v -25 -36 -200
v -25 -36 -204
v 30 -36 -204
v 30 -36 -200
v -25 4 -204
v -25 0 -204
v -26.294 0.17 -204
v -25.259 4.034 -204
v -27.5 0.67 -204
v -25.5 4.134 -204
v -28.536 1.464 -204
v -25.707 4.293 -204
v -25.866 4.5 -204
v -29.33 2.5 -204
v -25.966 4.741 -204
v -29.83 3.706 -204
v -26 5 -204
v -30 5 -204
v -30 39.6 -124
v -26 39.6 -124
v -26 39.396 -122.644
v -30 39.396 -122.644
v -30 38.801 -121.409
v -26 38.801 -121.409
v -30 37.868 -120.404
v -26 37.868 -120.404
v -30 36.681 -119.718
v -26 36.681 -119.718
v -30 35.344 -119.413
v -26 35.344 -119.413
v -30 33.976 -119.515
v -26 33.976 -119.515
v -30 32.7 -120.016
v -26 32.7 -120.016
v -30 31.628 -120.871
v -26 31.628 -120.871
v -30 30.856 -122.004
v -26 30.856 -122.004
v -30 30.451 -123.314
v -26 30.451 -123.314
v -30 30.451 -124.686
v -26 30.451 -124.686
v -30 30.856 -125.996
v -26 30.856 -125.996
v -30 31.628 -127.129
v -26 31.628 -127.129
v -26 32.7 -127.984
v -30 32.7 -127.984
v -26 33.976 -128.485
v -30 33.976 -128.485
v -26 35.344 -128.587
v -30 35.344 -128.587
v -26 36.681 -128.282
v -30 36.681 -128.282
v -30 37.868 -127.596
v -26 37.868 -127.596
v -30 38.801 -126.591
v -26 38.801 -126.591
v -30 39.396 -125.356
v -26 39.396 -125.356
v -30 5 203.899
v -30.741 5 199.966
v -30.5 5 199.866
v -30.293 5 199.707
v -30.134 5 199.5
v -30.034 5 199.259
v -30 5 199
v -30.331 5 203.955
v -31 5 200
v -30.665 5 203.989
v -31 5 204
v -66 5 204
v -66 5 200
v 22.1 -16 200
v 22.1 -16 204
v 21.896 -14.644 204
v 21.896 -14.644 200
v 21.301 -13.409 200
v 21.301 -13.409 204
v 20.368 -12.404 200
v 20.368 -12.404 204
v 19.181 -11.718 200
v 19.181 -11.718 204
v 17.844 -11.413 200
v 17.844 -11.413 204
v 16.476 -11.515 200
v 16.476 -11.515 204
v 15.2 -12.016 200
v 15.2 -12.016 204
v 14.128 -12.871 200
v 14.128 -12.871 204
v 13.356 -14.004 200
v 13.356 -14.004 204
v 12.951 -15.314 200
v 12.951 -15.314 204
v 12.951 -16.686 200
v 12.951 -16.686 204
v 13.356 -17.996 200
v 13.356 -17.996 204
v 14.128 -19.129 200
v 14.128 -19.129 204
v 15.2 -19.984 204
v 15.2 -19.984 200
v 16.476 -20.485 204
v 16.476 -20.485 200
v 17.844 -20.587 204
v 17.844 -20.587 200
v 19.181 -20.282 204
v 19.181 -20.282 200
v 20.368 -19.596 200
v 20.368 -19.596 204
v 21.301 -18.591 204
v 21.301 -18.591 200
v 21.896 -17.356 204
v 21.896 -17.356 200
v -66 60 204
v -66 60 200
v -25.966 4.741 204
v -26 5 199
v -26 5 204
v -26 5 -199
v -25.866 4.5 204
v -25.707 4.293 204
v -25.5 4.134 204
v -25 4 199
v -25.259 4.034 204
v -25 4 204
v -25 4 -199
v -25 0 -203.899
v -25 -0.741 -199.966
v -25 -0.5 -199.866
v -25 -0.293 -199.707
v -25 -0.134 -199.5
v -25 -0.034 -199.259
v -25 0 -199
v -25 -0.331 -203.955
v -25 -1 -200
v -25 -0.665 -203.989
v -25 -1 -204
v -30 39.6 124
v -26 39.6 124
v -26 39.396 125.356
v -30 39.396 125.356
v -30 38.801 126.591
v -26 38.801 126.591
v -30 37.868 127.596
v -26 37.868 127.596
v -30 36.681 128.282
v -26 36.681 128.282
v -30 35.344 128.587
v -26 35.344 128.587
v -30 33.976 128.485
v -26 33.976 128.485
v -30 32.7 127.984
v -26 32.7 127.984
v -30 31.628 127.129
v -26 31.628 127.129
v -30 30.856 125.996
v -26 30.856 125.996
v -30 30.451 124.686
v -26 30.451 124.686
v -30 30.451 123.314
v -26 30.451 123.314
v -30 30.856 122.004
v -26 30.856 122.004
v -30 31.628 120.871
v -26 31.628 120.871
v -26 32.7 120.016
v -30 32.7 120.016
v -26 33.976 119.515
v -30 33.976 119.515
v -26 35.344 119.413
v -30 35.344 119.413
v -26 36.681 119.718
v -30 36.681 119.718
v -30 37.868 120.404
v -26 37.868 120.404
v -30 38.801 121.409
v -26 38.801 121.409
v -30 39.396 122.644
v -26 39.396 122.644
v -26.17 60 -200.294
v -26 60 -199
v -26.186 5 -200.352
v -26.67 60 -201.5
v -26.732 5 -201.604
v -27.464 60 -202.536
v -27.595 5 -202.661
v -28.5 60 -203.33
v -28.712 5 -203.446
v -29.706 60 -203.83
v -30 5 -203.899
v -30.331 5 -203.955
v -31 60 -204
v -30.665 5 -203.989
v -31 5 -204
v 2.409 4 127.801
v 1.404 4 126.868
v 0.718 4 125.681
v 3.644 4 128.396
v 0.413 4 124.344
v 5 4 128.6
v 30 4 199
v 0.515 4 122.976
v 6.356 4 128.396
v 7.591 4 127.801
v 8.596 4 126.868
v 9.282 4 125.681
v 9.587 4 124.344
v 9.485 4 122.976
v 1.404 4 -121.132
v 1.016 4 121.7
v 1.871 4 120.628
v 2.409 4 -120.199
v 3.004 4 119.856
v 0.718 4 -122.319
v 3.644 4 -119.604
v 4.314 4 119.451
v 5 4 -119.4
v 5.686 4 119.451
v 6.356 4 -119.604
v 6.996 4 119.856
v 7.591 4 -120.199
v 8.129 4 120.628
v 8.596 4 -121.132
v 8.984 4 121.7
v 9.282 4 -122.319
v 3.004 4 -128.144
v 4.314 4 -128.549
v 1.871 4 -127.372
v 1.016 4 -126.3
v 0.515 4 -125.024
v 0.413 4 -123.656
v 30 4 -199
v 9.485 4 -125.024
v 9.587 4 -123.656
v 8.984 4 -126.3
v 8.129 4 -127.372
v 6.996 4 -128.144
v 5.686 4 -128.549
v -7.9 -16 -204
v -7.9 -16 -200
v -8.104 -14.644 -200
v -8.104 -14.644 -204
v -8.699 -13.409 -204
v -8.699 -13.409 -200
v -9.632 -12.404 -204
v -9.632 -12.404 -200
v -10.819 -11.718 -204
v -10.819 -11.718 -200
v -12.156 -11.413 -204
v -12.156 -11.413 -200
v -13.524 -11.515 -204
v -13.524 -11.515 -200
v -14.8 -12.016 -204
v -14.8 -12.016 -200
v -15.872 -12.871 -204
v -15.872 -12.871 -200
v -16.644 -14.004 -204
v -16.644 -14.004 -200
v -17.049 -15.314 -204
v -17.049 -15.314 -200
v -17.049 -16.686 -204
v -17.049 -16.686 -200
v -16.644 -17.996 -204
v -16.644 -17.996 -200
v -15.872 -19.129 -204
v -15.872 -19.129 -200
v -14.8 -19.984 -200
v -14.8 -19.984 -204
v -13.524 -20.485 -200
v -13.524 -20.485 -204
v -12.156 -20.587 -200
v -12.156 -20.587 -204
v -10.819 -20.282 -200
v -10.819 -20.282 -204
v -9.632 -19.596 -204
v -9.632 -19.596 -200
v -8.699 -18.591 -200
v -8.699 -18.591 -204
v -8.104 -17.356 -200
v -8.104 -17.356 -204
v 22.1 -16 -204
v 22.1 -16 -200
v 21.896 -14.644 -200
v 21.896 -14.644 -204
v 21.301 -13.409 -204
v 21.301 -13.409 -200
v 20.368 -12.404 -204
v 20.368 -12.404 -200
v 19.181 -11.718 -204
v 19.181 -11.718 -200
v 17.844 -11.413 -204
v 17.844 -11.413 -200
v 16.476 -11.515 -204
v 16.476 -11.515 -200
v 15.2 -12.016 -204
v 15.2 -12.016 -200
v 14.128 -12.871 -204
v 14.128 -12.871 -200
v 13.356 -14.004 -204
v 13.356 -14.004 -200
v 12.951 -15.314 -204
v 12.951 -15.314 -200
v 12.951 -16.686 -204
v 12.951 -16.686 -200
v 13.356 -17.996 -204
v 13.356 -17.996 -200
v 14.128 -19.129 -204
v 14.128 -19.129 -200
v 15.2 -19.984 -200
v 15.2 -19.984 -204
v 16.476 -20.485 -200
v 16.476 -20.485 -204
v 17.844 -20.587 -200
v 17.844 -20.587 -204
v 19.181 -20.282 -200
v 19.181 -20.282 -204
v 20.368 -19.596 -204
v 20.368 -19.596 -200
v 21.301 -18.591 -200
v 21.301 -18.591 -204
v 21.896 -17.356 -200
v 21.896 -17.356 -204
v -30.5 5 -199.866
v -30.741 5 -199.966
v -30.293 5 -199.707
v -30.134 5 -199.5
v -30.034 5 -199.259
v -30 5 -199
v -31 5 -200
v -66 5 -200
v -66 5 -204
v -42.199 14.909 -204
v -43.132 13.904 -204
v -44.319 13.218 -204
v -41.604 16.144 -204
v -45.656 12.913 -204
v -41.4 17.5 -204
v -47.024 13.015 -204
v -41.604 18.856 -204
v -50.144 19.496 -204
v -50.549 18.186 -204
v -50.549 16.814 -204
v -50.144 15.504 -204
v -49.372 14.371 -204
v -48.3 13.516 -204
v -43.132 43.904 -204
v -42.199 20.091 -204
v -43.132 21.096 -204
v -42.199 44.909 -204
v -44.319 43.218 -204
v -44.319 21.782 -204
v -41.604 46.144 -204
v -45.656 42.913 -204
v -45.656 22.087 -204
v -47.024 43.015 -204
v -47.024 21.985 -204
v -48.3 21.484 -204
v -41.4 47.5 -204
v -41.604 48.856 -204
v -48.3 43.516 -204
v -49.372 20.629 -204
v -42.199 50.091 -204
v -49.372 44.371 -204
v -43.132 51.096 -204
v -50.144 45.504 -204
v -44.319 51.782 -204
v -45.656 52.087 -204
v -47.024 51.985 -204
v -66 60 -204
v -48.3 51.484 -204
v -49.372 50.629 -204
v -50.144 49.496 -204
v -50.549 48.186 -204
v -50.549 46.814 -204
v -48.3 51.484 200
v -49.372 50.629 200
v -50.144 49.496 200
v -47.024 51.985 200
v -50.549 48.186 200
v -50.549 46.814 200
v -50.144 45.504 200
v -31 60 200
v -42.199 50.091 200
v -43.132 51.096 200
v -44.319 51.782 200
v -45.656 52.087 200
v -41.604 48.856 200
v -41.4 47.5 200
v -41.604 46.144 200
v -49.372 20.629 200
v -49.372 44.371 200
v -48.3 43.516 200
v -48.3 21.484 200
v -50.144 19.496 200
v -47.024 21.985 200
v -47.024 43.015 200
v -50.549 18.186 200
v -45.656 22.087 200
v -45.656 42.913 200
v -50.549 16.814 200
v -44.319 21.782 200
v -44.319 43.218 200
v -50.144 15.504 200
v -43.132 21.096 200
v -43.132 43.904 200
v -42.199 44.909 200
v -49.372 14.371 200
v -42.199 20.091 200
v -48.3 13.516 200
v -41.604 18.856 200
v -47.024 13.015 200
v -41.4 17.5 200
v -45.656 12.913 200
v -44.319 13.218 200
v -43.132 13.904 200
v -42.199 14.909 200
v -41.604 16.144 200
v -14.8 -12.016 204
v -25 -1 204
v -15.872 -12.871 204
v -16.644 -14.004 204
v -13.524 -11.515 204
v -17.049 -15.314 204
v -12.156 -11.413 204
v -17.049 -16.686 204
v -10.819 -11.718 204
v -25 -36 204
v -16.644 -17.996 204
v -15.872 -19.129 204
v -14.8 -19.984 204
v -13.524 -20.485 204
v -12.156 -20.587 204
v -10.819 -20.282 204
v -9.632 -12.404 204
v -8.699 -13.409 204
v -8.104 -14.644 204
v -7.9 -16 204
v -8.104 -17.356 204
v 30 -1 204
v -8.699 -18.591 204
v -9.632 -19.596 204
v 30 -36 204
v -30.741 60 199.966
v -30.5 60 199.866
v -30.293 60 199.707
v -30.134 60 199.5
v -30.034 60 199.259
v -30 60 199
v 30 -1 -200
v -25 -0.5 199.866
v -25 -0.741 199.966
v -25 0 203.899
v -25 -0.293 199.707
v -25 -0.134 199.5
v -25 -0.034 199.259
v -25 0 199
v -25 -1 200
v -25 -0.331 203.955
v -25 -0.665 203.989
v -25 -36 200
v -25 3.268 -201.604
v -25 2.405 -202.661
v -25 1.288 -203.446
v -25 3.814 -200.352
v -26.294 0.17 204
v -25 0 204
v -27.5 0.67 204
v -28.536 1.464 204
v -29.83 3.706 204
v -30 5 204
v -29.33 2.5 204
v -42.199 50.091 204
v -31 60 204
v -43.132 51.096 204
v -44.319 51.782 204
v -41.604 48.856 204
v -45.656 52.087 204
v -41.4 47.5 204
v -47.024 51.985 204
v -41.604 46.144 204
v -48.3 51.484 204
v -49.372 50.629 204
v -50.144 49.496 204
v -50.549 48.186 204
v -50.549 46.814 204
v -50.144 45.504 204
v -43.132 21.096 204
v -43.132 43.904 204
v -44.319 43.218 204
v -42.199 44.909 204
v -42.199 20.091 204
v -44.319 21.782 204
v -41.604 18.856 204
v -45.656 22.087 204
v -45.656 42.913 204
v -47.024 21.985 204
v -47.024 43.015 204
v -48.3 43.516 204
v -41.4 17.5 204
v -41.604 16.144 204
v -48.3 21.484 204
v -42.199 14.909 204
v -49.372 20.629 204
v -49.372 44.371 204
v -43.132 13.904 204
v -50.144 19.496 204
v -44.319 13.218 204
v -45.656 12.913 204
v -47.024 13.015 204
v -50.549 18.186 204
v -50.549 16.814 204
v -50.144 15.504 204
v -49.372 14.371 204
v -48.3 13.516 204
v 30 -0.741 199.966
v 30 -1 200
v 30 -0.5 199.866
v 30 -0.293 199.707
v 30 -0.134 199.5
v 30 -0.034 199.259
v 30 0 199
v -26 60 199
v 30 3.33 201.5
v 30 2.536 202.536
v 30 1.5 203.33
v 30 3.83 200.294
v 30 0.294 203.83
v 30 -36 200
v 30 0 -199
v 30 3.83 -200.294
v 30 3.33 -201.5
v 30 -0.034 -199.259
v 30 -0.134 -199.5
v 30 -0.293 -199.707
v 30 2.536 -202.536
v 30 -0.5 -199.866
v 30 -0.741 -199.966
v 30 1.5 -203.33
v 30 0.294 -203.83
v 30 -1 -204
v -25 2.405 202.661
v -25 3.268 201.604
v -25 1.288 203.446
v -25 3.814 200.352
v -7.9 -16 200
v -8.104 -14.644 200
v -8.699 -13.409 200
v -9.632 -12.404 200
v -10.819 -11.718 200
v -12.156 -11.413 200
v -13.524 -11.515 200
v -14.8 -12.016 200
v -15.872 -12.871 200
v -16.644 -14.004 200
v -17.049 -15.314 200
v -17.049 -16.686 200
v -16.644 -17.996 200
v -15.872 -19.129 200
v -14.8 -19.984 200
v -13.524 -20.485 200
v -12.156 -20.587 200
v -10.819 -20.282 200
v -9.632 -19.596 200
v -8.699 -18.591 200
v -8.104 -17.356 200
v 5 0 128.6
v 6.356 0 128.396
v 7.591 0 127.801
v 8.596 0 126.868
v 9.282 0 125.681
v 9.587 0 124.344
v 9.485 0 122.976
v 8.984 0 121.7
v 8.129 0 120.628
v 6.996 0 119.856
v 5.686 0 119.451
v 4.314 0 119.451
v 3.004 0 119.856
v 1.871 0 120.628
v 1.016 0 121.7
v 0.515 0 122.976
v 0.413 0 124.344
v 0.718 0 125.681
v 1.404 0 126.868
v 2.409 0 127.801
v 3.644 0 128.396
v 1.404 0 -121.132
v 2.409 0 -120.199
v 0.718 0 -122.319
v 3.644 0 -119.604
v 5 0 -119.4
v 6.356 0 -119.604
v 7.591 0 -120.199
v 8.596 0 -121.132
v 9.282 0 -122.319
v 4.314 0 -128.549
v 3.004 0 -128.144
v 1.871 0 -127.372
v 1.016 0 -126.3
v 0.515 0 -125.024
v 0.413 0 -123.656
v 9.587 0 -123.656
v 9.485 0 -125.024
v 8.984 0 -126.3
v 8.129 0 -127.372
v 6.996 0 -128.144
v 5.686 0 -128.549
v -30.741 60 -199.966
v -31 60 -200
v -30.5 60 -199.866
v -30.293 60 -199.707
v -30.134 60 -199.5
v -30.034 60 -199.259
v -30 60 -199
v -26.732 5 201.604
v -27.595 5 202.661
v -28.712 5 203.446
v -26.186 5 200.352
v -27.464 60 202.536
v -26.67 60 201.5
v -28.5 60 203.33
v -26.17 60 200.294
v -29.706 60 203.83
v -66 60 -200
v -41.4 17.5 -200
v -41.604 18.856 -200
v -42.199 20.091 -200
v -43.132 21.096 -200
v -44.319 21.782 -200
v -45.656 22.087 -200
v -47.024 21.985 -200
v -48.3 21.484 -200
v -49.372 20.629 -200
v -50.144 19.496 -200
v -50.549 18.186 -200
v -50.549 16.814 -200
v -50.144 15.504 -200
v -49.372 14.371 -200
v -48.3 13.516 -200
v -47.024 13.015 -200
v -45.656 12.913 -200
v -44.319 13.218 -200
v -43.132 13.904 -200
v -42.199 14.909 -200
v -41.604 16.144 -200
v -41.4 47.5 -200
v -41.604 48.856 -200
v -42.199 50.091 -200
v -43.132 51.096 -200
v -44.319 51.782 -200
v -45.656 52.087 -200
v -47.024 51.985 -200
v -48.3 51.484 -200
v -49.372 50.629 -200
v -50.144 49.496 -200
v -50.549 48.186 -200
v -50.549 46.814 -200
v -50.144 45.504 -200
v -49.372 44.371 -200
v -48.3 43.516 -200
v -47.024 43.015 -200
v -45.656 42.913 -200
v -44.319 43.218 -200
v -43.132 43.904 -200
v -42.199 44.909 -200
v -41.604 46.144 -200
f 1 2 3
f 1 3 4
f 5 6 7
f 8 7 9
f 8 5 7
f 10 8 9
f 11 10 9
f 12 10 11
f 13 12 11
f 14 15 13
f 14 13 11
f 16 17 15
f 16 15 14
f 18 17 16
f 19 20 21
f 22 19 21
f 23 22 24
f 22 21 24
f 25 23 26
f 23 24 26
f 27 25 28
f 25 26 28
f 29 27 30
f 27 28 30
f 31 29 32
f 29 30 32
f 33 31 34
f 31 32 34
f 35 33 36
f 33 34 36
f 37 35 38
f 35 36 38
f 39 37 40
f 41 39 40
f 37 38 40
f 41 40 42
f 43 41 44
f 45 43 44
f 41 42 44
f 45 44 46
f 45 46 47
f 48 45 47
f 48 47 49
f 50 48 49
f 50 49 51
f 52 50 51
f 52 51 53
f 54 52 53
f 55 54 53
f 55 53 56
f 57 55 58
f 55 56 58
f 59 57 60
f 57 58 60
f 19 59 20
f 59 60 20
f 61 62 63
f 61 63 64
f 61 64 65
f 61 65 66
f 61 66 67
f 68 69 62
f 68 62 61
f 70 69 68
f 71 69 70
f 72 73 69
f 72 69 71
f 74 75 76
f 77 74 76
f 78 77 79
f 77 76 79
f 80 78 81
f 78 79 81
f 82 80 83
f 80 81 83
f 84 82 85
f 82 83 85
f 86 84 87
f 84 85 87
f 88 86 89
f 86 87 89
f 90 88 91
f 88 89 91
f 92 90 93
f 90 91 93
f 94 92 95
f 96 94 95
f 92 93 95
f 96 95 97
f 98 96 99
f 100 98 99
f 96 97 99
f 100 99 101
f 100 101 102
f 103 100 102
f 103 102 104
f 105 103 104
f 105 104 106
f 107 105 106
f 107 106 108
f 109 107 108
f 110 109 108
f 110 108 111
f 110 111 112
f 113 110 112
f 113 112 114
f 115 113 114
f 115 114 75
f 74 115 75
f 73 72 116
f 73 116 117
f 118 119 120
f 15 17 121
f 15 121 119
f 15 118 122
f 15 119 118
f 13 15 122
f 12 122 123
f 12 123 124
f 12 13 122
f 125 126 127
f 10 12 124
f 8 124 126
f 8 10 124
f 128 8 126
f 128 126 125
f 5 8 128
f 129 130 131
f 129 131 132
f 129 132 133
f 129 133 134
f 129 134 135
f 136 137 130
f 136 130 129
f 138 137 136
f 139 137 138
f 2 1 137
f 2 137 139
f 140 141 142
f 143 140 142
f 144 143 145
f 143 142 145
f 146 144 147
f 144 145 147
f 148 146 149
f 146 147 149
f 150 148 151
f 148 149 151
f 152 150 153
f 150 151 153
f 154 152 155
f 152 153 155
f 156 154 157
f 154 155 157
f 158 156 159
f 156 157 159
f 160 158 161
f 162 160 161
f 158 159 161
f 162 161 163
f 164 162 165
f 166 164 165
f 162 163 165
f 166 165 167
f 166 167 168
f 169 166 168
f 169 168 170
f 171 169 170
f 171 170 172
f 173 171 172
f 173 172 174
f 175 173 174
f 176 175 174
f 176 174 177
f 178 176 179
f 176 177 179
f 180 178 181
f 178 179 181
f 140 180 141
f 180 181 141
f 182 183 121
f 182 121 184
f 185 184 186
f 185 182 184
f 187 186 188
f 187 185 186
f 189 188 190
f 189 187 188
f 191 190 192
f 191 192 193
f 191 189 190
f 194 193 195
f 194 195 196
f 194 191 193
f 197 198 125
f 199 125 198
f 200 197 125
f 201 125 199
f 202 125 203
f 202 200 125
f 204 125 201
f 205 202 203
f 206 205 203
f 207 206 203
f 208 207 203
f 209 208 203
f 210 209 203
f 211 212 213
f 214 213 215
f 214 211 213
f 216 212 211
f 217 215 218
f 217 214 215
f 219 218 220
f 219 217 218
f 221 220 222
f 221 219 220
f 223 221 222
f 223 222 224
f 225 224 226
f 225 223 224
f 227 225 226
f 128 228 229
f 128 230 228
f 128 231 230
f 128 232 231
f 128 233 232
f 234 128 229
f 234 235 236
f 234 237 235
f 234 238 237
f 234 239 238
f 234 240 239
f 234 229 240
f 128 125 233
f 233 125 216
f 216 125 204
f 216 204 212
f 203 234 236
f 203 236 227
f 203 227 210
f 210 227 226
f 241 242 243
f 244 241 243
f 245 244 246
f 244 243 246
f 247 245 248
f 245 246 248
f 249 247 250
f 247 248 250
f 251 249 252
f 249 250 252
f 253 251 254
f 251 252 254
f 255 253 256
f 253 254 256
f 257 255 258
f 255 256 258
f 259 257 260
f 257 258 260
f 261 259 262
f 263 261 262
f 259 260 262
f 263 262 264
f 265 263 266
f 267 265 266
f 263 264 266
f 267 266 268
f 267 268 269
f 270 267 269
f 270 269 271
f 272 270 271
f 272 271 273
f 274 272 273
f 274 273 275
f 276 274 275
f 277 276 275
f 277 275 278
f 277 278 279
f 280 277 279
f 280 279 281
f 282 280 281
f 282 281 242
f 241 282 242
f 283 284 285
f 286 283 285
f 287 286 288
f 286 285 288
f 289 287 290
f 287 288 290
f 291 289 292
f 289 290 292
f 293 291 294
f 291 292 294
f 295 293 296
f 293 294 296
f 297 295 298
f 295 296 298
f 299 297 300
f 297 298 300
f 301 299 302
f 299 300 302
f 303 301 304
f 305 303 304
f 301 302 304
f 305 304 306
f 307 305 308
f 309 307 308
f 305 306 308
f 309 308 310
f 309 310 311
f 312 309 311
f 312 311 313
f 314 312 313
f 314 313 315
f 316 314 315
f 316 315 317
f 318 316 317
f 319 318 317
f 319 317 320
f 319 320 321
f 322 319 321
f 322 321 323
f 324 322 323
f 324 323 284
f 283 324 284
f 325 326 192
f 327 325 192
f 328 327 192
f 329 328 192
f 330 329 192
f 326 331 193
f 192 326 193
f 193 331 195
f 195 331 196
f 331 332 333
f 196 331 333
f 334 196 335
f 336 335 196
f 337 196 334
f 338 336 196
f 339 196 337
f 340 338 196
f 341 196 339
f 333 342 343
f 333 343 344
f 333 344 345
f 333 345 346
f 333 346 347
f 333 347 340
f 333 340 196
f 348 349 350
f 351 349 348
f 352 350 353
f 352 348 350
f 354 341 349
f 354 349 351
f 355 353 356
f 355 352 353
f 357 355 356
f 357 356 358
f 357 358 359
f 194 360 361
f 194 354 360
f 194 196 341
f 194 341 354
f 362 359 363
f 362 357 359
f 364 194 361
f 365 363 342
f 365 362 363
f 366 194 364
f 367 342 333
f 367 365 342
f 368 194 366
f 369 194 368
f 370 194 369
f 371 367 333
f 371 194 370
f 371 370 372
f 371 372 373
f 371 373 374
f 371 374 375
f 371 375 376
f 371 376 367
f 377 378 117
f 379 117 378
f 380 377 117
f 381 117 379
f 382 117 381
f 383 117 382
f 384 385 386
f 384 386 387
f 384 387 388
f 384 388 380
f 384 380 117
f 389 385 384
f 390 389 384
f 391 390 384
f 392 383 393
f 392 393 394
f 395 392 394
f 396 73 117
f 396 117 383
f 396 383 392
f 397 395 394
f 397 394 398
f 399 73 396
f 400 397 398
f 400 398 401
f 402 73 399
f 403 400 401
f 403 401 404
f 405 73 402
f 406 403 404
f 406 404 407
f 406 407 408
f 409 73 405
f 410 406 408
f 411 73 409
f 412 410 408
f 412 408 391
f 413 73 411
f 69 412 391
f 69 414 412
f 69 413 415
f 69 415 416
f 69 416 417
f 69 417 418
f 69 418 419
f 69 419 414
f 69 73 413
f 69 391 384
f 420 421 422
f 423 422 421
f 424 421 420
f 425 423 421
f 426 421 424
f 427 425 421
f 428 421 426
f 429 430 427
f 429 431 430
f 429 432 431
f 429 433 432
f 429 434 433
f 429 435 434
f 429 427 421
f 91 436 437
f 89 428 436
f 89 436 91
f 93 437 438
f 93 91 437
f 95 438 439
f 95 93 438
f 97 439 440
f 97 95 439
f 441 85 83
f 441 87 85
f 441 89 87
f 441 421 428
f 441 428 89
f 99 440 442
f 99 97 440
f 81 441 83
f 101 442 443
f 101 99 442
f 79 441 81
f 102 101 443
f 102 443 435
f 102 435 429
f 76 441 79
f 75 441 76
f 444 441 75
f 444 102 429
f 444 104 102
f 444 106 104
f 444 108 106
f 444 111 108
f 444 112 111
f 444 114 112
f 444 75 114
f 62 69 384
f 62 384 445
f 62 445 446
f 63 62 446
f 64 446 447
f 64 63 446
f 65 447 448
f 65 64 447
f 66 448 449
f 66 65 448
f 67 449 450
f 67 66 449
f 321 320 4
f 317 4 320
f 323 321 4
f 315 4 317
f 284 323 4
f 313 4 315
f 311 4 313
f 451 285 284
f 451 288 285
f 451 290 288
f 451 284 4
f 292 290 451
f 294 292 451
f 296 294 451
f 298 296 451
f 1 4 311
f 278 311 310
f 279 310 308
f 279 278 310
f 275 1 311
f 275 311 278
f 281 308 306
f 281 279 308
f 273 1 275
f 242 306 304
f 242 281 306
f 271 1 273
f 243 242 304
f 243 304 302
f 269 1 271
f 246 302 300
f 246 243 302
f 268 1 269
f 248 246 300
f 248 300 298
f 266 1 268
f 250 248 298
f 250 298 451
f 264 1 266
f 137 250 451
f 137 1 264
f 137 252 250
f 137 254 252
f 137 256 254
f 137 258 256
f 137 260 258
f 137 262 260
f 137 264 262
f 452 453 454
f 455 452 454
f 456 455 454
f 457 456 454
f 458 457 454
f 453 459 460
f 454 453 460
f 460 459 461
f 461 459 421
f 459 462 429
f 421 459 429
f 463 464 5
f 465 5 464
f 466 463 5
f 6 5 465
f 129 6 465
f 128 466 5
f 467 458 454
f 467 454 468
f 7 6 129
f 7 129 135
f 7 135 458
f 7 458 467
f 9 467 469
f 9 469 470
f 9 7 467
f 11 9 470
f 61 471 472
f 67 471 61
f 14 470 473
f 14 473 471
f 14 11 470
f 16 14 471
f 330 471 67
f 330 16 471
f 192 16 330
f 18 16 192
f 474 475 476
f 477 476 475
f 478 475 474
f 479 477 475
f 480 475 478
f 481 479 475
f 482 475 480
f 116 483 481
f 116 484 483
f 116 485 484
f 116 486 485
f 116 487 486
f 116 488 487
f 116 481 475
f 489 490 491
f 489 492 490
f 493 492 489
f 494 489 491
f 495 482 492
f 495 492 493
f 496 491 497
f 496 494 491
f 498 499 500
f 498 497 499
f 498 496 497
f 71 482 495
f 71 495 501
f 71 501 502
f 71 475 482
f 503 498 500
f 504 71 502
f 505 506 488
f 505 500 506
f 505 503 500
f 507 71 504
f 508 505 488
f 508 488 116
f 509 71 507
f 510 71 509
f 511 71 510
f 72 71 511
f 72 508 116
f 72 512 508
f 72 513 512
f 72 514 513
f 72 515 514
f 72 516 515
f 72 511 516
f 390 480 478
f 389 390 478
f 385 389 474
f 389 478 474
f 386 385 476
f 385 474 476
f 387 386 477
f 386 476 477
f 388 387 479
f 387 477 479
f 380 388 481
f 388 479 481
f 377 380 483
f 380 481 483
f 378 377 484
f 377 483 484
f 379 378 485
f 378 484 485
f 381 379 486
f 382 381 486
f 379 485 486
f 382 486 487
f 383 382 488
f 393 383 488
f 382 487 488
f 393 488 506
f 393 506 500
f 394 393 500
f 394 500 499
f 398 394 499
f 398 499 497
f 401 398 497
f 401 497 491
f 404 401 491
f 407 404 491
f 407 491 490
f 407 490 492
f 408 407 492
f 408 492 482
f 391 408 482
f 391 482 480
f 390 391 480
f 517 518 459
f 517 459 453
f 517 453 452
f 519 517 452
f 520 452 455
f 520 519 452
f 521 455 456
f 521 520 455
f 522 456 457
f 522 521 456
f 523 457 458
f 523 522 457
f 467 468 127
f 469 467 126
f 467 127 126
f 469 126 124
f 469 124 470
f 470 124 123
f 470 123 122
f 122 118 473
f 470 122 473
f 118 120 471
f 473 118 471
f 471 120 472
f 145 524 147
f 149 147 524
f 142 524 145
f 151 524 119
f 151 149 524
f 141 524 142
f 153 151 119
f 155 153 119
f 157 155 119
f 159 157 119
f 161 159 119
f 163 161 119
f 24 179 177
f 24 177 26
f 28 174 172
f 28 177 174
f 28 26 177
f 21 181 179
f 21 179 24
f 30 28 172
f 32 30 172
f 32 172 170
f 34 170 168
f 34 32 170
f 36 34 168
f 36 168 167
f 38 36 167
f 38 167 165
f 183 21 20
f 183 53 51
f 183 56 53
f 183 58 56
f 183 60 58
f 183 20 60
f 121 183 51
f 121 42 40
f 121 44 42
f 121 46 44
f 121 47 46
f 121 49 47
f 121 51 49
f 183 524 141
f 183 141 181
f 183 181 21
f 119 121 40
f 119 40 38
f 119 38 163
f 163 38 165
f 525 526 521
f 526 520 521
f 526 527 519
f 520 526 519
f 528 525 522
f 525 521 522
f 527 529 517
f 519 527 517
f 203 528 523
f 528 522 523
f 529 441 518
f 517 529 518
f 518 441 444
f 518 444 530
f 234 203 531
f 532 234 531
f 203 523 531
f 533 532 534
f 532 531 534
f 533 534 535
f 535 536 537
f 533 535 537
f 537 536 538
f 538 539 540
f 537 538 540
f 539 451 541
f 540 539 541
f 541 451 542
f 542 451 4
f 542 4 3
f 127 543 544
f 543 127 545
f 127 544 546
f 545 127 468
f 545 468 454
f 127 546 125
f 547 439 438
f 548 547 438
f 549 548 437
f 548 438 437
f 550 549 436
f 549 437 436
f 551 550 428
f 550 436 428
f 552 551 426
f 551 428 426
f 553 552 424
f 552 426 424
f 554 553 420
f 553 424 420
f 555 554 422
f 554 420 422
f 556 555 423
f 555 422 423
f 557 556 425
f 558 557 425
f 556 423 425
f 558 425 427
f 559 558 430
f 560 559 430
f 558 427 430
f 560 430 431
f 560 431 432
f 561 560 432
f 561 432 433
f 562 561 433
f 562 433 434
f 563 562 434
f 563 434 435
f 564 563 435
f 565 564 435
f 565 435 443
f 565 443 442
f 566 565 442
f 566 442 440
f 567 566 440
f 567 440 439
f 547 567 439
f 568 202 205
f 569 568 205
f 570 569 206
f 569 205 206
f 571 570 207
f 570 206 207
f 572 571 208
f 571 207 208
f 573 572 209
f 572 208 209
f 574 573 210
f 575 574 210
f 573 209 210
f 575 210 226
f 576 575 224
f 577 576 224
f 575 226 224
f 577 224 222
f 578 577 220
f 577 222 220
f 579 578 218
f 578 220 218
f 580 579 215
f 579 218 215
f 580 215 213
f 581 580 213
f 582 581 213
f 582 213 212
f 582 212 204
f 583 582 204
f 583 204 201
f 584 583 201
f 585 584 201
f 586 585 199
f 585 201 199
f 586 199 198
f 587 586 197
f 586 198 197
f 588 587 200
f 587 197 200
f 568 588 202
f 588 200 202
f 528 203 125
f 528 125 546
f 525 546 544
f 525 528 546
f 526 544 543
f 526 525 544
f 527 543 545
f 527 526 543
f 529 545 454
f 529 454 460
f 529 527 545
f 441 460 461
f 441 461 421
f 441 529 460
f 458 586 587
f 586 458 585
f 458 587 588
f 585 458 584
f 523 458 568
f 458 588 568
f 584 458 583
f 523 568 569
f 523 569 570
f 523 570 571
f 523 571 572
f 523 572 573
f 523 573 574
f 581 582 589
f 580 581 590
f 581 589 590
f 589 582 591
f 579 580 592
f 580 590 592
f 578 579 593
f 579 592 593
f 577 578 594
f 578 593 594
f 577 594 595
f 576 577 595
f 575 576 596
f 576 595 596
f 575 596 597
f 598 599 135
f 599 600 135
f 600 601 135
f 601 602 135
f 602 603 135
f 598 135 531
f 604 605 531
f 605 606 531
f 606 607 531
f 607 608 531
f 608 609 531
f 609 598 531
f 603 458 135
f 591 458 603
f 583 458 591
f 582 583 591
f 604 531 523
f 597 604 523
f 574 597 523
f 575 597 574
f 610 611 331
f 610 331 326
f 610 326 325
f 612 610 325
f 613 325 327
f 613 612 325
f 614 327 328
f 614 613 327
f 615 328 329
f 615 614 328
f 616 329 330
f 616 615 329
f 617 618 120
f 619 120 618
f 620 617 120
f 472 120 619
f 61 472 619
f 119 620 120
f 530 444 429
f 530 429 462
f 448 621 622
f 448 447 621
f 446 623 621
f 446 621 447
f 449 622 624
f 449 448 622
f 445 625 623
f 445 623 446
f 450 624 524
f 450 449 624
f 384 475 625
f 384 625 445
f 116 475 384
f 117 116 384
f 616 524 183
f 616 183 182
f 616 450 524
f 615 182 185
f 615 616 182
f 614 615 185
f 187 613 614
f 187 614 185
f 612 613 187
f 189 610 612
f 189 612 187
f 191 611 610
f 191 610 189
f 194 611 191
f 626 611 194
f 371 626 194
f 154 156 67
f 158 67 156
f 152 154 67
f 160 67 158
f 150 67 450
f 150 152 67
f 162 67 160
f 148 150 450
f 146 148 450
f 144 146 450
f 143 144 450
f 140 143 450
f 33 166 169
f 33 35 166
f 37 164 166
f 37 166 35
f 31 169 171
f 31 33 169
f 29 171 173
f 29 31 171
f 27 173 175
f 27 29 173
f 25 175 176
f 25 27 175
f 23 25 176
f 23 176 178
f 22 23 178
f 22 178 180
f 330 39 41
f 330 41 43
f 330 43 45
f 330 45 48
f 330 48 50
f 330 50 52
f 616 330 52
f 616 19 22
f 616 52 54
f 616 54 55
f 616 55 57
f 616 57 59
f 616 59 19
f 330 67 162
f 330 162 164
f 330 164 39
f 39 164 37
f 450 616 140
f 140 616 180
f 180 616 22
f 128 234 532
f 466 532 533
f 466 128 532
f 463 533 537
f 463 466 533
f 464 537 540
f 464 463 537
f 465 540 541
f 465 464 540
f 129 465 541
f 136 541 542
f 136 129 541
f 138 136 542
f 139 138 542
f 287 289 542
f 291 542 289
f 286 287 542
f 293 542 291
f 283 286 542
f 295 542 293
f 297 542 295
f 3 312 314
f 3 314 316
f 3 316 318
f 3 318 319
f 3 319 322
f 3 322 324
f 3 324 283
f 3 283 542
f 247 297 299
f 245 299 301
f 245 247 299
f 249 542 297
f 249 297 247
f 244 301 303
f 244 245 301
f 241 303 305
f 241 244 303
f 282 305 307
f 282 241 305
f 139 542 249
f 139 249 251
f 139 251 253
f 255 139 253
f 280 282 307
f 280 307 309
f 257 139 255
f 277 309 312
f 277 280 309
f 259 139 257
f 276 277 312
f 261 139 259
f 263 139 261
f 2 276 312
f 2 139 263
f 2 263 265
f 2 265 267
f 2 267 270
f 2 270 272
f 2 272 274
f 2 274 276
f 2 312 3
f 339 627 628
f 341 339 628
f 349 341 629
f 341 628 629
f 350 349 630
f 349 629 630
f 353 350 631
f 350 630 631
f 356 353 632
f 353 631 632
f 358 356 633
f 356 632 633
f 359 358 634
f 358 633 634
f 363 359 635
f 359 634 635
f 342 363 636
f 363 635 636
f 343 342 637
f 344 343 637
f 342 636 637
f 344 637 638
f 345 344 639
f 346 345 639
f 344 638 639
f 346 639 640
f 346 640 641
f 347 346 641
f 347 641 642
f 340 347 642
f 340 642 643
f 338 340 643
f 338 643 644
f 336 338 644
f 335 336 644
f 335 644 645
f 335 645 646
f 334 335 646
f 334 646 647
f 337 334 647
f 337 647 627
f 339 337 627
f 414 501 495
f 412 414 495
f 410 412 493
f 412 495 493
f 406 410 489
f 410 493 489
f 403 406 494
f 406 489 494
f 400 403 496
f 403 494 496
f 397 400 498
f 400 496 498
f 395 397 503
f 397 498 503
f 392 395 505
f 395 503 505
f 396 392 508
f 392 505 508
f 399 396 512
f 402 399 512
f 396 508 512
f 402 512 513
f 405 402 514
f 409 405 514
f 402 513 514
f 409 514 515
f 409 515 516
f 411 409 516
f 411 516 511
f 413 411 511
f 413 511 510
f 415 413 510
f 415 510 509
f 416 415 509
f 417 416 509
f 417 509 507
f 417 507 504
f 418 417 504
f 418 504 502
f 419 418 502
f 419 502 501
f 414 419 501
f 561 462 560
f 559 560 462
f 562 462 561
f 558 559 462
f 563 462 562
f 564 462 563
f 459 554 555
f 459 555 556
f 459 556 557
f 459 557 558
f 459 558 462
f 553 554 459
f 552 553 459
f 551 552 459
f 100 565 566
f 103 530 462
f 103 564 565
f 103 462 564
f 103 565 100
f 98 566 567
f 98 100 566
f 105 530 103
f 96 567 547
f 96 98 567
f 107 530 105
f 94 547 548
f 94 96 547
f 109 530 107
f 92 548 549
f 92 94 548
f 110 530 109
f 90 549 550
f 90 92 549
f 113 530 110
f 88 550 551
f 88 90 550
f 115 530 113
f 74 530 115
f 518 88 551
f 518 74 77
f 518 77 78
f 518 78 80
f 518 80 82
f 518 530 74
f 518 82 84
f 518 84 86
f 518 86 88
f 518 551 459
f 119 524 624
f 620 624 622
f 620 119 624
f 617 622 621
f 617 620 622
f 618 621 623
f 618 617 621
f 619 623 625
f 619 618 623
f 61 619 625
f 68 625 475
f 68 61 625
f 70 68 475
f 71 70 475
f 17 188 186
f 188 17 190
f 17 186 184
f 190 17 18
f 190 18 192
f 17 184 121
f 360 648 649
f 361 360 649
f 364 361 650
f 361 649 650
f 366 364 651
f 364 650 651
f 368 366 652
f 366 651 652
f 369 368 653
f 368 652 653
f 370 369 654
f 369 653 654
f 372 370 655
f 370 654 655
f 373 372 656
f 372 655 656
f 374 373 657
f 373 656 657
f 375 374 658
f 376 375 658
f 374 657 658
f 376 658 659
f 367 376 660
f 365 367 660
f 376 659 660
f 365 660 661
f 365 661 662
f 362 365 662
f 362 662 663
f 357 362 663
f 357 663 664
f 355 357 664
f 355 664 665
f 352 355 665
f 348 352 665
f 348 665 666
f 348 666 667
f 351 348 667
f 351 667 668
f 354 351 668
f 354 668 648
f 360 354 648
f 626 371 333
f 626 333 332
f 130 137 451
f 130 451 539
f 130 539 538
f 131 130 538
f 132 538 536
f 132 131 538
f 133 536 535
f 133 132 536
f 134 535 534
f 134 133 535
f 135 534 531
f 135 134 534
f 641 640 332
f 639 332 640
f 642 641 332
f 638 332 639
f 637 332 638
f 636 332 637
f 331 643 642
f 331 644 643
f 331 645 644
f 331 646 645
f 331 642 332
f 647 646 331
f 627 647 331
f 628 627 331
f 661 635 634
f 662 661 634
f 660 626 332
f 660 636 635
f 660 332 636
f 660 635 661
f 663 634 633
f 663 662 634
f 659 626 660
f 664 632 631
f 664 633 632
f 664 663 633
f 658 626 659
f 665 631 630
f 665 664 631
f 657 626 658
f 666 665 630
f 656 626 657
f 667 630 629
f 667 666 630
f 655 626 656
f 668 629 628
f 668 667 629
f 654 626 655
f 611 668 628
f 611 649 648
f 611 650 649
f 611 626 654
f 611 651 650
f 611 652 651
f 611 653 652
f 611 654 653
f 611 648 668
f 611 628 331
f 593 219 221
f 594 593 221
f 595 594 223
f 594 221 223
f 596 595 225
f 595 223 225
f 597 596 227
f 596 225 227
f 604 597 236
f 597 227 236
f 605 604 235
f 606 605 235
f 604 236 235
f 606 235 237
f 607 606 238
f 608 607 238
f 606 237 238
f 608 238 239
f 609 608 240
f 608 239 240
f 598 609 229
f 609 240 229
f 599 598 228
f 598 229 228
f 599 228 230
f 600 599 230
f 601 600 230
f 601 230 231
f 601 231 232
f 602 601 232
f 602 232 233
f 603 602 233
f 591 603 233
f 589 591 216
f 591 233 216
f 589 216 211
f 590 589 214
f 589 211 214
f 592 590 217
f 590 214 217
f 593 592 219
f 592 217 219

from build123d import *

# Parameters (mm, degrees)
SKETCH1_W                      = 60
SKETCH1_H                      = 408
BASE_FLANGE1_DEPTH             = 4
EDGE_FLANGE1_STRIP_W           = 18
EDGE_FLANGE1_STRIP_H           = 4
EDGE_FLANGE1_STRIP_CUT_DEPTH   = 408
EDGE_FLANGE1_DEPTH             = 408
EDGE_FLANGE2_STRIP_W           = 18
EDGE_FLANGE2_STRIP_H           = 4
EDGE_FLANGE2_STRIP_CUT_DEPTH   = 55
EDGE_FLANGE2_STRIP_2_W         = 18
EDGE_FLANGE2_STRIP_2_H         = 4
EDGE_FLANGE2_STRIP_CUT_2_DEPTH = 55
EDGE_FLANGE2_STRIP_3_W         = 18
EDGE_FLANGE2_STRIP_3_H         = 4
EDGE_FLANGE2_STRIP_CUT_3_DEPTH = 55
EDGE_FLANGE2_STRIP_4_W         = 18
EDGE_FLANGE2_STRIP_4_H         = 4
EDGE_FLANGE2_STRIP_CUT_4_DEPTH = 55
EDGE_FLANGE2_DEPTH             = 55
EDGE_FLANGE2_BEND_DEPTH        = 55
EDGE_FLANGE2_BEND_2_DEPTH      = 55
EDGE_FLANGE2_BEND_3_DEPTH      = 55
SKETCH18_R                     = 4.6
EXTRUDE1_DEPTH                 = 418.636205327
SKETCH19_R                     = 4.6
EXTRUDE2_DEPTH                 = 4
SKETCH20_R                     = 4.6
EXTRUDE3_DEPTH                 = 4


# Sheet-metal steps are written as plain solids
with BuildPart() as part:
    # Sketch1 → Base-Flange1 (new body)
    with BuildSketch(Plane(origin=(0, 0, 0), x_dir=(1, 0, 0), z_dir=(0, 1, 0))):
        Rectangle(SKETCH1_W, SKETCH1_H)
    extrude(amount=BASE_FLANGE1_DEPTH)

    # Edge-Flange1 strip (across the edge) → Edge-Flange1 strip cut (cut)
    with BuildSketch(Plane(origin=(-30, 4, -204), x_dir=(1, 0, 0), z_dir=(0, 0, 1))):
        with Locations((-4, -2)):
            Rectangle(EDGE_FLANGE1_STRIP_W, EDGE_FLANGE1_STRIP_H)
    extrude(amount=EDGE_FLANGE1_STRIP_CUT_DEPTH, mode=Mode.SUBTRACT)

    # Edge-Flange1 section (across the edge) → Edge-Flange1 (add)
    with BuildSketch(Plane(origin=(-30, 4, -204), x_dir=(1, 0, 0), z_dir=(0, 0, 1))):
        with BuildLine():
            Line((0, 1), (0, 56))
            Line((0, 56), (4, 56))
            Line((4, 56), (4, 1))
            ThreePointArc((4, 1), (4.292893219, 0.292893219), (5, 0))
            Line((5, 0), (5, -4))
            ThreePointArc((5, -4), (1.464466094, -2.535533906), (0, 1))
        make_face()
    extrude(amount=EDGE_FLANGE1_DEPTH)

    # Edge-Flange2 strip (across the edge) → Edge-Flange2 strip cut (cut)
    with BuildSketch(Plane(origin=(-30, 5, 204), x_dir=(0, 0, -1), z_dir=(0, 1, 0))):
        with Locations((-4, -2)):
            Rectangle(EDGE_FLANGE2_STRIP_W, EDGE_FLANGE2_STRIP_H)
    extrude(amount=EDGE_FLANGE2_STRIP_CUT_DEPTH, mode=Mode.SUBTRACT)

    # Edge-Flange2 strip 2 (across the edge) → Edge-Flange2 strip cut 2 (cut)
    with BuildSketch(Plane(origin=(30, 0, 204), x_dir=(0, 0, -1), z_dir=(-1, 0, 0))):
        with Locations((-4, -2)):
            Rectangle(EDGE_FLANGE2_STRIP_2_W, EDGE_FLANGE2_STRIP_2_H)
    extrude(amount=EDGE_FLANGE2_STRIP_CUT_2_DEPTH, mode=Mode.SUBTRACT)

    # Edge-Flange2 strip 3 (across the edge) → Edge-Flange2 strip cut 3 (cut)
    with BuildSketch(Plane(origin=(-30, 60, -204), x_dir=(0, 0, 1), z_dir=(0, -1, 0))):
        with Locations((-4, -2)):
            Rectangle(EDGE_FLANGE2_STRIP_3_W, EDGE_FLANGE2_STRIP_3_H)
    extrude(amount=EDGE_FLANGE2_STRIP_CUT_3_DEPTH, mode=Mode.SUBTRACT)

    # Edge-Flange2 strip 4 (across the edge) → Edge-Flange2 strip cut 4 (cut)
    with BuildSketch(Plane(origin=(-25, 0, -204), x_dir=(0, 0, 1), z_dir=(1, 0, 0))):
        with Locations((-4, -2)):
            Rectangle(EDGE_FLANGE2_STRIP_4_W, EDGE_FLANGE2_STRIP_4_H)
    extrude(amount=EDGE_FLANGE2_STRIP_CUT_4_DEPTH, mode=Mode.SUBTRACT)

    # Edge-Flange2 section (across the edge) → Edge-Flange2 (add)
    with BuildSketch(Plane(origin=(-30, 5, 204), x_dir=(0, 0, -1), z_dir=(0, 1, 0))):
        with BuildLine():
            Line((0, 1), (0, 36))
            Line((0, 36), (4, 36))
            Line((4, 36), (4, 1))
            ThreePointArc((4, 1), (4.292893219, 0.292893219), (5, 0))
            Line((5, 0), (5, -4))
            ThreePointArc((5, -4), (1.464466094, -2.535533906), (0, 1))
        make_face()
    extrude(amount=EDGE_FLANGE2_DEPTH)

    # Edge-Flange2 section 2 (across the edge) → Edge-Flange2 bend (add)
    with BuildSketch(Plane(origin=(30, 0, 204), x_dir=(0, 0, -1), z_dir=(-1, 0, 0))):
        with BuildLine():
            Line((0, 1), (0, 36))
            Line((0, 36), (4, 36))
            Line((4, 36), (4, 1))
            ThreePointArc((4, 1), (4.292893219, 0.292893219), (5, 0))
            Line((5, 0), (5, -4))
            ThreePointArc((5, -4), (1.464466094, -2.535533906), (0, 1))
        make_face()
    extrude(amount=EDGE_FLANGE2_BEND_DEPTH)

    # Edge-Flange2 section 3 (across the edge) → Edge-Flange2 bend 2 (add)
    with BuildSketch(Plane(origin=(-30, 60, -204), x_dir=(0, 0, 1), z_dir=(0, -1, 0))):
        with BuildLine():
            Line((0, 1), (0, 36))
            Line((0, 36), (4, 36))
            Line((4, 36), (4, 1))
            ThreePointArc((4, 1), (4.292893219, 0.292893219), (5, 0))
            Line((5, 0), (5, -4))
            ThreePointArc((5, -4), (1.464466094, -2.535533906), (0, 1))
        make_face()
    extrude(amount=EDGE_FLANGE2_BEND_2_DEPTH)

    # Edge-Flange2 section 4 (across the edge) → Edge-Flange2 bend 3 (add)
    with BuildSketch(Plane(origin=(-25, 0, -204), x_dir=(0, 0, 1), z_dir=(1, 0, 0))):
        with BuildLine():
            Line((0, 1), (0, 36))
            Line((0, 36), (4, 36))
            Line((4, 36), (4, 1))
            ThreePointArc((4, 1), (4.292893219, 0.292893219), (5, 0))
            Line((5, 0), (5, -4))
            ThreePointArc((5, -4), (1.464466094, -2.535533906), (0, 1))
        make_face()
    extrude(amount=EDGE_FLANGE2_BEND_3_DEPTH)

    # Sketch18 → Extrude1 (cut, through all)
    with BuildSketch(Plane.XY.offset(204)):
        with Locations((-46, 47.5)):
            Circle(SKETCH18_R)
        with Locations((-46, 17.5)):
            Circle(SKETCH18_R)
        with Locations((-12.5, -16)):
            Circle(SKETCH18_R)
        with Locations((17.5, -16)):
            Circle(SKETCH18_R)
    extrude(amount=-EXTRUDE1_DEPTH, mode=Mode.SUBTRACT)

    # Sketch19 → Extrude2 (cut)
    with BuildSketch(Plane(origin=(-26, 0, 0), x_dir=(0, 0, -1), z_dir=(1, 0, 0))):
        with Locations(Location((-124, 35, 0), (0, 0, 90))):
            Circle(SKETCH19_R)
        with Locations(Location((124, 35, 0), (0, 0, 90))):
            Circle(SKETCH19_R)
    extrude(amount=-EXTRUDE2_DEPTH, mode=Mode.SUBTRACT)

    # Sketch20 → Extrude3 (cut)
    with BuildSketch(Plane(origin=(0, 4, 0), x_dir=(1, 0, 0), z_dir=(0, 1, 0))):
        with Locations(Location((5, 124, 0), (0, 0, 270))):
            Circle(SKETCH20_R)
        with Locations(Location((5, -124, 0), (0, 0, 270))):
            Circle(SKETCH20_R)
    extrude(amount=-EXTRUDE3_DEPTH, mode=Mode.SUBTRACT)


solid = part.part
